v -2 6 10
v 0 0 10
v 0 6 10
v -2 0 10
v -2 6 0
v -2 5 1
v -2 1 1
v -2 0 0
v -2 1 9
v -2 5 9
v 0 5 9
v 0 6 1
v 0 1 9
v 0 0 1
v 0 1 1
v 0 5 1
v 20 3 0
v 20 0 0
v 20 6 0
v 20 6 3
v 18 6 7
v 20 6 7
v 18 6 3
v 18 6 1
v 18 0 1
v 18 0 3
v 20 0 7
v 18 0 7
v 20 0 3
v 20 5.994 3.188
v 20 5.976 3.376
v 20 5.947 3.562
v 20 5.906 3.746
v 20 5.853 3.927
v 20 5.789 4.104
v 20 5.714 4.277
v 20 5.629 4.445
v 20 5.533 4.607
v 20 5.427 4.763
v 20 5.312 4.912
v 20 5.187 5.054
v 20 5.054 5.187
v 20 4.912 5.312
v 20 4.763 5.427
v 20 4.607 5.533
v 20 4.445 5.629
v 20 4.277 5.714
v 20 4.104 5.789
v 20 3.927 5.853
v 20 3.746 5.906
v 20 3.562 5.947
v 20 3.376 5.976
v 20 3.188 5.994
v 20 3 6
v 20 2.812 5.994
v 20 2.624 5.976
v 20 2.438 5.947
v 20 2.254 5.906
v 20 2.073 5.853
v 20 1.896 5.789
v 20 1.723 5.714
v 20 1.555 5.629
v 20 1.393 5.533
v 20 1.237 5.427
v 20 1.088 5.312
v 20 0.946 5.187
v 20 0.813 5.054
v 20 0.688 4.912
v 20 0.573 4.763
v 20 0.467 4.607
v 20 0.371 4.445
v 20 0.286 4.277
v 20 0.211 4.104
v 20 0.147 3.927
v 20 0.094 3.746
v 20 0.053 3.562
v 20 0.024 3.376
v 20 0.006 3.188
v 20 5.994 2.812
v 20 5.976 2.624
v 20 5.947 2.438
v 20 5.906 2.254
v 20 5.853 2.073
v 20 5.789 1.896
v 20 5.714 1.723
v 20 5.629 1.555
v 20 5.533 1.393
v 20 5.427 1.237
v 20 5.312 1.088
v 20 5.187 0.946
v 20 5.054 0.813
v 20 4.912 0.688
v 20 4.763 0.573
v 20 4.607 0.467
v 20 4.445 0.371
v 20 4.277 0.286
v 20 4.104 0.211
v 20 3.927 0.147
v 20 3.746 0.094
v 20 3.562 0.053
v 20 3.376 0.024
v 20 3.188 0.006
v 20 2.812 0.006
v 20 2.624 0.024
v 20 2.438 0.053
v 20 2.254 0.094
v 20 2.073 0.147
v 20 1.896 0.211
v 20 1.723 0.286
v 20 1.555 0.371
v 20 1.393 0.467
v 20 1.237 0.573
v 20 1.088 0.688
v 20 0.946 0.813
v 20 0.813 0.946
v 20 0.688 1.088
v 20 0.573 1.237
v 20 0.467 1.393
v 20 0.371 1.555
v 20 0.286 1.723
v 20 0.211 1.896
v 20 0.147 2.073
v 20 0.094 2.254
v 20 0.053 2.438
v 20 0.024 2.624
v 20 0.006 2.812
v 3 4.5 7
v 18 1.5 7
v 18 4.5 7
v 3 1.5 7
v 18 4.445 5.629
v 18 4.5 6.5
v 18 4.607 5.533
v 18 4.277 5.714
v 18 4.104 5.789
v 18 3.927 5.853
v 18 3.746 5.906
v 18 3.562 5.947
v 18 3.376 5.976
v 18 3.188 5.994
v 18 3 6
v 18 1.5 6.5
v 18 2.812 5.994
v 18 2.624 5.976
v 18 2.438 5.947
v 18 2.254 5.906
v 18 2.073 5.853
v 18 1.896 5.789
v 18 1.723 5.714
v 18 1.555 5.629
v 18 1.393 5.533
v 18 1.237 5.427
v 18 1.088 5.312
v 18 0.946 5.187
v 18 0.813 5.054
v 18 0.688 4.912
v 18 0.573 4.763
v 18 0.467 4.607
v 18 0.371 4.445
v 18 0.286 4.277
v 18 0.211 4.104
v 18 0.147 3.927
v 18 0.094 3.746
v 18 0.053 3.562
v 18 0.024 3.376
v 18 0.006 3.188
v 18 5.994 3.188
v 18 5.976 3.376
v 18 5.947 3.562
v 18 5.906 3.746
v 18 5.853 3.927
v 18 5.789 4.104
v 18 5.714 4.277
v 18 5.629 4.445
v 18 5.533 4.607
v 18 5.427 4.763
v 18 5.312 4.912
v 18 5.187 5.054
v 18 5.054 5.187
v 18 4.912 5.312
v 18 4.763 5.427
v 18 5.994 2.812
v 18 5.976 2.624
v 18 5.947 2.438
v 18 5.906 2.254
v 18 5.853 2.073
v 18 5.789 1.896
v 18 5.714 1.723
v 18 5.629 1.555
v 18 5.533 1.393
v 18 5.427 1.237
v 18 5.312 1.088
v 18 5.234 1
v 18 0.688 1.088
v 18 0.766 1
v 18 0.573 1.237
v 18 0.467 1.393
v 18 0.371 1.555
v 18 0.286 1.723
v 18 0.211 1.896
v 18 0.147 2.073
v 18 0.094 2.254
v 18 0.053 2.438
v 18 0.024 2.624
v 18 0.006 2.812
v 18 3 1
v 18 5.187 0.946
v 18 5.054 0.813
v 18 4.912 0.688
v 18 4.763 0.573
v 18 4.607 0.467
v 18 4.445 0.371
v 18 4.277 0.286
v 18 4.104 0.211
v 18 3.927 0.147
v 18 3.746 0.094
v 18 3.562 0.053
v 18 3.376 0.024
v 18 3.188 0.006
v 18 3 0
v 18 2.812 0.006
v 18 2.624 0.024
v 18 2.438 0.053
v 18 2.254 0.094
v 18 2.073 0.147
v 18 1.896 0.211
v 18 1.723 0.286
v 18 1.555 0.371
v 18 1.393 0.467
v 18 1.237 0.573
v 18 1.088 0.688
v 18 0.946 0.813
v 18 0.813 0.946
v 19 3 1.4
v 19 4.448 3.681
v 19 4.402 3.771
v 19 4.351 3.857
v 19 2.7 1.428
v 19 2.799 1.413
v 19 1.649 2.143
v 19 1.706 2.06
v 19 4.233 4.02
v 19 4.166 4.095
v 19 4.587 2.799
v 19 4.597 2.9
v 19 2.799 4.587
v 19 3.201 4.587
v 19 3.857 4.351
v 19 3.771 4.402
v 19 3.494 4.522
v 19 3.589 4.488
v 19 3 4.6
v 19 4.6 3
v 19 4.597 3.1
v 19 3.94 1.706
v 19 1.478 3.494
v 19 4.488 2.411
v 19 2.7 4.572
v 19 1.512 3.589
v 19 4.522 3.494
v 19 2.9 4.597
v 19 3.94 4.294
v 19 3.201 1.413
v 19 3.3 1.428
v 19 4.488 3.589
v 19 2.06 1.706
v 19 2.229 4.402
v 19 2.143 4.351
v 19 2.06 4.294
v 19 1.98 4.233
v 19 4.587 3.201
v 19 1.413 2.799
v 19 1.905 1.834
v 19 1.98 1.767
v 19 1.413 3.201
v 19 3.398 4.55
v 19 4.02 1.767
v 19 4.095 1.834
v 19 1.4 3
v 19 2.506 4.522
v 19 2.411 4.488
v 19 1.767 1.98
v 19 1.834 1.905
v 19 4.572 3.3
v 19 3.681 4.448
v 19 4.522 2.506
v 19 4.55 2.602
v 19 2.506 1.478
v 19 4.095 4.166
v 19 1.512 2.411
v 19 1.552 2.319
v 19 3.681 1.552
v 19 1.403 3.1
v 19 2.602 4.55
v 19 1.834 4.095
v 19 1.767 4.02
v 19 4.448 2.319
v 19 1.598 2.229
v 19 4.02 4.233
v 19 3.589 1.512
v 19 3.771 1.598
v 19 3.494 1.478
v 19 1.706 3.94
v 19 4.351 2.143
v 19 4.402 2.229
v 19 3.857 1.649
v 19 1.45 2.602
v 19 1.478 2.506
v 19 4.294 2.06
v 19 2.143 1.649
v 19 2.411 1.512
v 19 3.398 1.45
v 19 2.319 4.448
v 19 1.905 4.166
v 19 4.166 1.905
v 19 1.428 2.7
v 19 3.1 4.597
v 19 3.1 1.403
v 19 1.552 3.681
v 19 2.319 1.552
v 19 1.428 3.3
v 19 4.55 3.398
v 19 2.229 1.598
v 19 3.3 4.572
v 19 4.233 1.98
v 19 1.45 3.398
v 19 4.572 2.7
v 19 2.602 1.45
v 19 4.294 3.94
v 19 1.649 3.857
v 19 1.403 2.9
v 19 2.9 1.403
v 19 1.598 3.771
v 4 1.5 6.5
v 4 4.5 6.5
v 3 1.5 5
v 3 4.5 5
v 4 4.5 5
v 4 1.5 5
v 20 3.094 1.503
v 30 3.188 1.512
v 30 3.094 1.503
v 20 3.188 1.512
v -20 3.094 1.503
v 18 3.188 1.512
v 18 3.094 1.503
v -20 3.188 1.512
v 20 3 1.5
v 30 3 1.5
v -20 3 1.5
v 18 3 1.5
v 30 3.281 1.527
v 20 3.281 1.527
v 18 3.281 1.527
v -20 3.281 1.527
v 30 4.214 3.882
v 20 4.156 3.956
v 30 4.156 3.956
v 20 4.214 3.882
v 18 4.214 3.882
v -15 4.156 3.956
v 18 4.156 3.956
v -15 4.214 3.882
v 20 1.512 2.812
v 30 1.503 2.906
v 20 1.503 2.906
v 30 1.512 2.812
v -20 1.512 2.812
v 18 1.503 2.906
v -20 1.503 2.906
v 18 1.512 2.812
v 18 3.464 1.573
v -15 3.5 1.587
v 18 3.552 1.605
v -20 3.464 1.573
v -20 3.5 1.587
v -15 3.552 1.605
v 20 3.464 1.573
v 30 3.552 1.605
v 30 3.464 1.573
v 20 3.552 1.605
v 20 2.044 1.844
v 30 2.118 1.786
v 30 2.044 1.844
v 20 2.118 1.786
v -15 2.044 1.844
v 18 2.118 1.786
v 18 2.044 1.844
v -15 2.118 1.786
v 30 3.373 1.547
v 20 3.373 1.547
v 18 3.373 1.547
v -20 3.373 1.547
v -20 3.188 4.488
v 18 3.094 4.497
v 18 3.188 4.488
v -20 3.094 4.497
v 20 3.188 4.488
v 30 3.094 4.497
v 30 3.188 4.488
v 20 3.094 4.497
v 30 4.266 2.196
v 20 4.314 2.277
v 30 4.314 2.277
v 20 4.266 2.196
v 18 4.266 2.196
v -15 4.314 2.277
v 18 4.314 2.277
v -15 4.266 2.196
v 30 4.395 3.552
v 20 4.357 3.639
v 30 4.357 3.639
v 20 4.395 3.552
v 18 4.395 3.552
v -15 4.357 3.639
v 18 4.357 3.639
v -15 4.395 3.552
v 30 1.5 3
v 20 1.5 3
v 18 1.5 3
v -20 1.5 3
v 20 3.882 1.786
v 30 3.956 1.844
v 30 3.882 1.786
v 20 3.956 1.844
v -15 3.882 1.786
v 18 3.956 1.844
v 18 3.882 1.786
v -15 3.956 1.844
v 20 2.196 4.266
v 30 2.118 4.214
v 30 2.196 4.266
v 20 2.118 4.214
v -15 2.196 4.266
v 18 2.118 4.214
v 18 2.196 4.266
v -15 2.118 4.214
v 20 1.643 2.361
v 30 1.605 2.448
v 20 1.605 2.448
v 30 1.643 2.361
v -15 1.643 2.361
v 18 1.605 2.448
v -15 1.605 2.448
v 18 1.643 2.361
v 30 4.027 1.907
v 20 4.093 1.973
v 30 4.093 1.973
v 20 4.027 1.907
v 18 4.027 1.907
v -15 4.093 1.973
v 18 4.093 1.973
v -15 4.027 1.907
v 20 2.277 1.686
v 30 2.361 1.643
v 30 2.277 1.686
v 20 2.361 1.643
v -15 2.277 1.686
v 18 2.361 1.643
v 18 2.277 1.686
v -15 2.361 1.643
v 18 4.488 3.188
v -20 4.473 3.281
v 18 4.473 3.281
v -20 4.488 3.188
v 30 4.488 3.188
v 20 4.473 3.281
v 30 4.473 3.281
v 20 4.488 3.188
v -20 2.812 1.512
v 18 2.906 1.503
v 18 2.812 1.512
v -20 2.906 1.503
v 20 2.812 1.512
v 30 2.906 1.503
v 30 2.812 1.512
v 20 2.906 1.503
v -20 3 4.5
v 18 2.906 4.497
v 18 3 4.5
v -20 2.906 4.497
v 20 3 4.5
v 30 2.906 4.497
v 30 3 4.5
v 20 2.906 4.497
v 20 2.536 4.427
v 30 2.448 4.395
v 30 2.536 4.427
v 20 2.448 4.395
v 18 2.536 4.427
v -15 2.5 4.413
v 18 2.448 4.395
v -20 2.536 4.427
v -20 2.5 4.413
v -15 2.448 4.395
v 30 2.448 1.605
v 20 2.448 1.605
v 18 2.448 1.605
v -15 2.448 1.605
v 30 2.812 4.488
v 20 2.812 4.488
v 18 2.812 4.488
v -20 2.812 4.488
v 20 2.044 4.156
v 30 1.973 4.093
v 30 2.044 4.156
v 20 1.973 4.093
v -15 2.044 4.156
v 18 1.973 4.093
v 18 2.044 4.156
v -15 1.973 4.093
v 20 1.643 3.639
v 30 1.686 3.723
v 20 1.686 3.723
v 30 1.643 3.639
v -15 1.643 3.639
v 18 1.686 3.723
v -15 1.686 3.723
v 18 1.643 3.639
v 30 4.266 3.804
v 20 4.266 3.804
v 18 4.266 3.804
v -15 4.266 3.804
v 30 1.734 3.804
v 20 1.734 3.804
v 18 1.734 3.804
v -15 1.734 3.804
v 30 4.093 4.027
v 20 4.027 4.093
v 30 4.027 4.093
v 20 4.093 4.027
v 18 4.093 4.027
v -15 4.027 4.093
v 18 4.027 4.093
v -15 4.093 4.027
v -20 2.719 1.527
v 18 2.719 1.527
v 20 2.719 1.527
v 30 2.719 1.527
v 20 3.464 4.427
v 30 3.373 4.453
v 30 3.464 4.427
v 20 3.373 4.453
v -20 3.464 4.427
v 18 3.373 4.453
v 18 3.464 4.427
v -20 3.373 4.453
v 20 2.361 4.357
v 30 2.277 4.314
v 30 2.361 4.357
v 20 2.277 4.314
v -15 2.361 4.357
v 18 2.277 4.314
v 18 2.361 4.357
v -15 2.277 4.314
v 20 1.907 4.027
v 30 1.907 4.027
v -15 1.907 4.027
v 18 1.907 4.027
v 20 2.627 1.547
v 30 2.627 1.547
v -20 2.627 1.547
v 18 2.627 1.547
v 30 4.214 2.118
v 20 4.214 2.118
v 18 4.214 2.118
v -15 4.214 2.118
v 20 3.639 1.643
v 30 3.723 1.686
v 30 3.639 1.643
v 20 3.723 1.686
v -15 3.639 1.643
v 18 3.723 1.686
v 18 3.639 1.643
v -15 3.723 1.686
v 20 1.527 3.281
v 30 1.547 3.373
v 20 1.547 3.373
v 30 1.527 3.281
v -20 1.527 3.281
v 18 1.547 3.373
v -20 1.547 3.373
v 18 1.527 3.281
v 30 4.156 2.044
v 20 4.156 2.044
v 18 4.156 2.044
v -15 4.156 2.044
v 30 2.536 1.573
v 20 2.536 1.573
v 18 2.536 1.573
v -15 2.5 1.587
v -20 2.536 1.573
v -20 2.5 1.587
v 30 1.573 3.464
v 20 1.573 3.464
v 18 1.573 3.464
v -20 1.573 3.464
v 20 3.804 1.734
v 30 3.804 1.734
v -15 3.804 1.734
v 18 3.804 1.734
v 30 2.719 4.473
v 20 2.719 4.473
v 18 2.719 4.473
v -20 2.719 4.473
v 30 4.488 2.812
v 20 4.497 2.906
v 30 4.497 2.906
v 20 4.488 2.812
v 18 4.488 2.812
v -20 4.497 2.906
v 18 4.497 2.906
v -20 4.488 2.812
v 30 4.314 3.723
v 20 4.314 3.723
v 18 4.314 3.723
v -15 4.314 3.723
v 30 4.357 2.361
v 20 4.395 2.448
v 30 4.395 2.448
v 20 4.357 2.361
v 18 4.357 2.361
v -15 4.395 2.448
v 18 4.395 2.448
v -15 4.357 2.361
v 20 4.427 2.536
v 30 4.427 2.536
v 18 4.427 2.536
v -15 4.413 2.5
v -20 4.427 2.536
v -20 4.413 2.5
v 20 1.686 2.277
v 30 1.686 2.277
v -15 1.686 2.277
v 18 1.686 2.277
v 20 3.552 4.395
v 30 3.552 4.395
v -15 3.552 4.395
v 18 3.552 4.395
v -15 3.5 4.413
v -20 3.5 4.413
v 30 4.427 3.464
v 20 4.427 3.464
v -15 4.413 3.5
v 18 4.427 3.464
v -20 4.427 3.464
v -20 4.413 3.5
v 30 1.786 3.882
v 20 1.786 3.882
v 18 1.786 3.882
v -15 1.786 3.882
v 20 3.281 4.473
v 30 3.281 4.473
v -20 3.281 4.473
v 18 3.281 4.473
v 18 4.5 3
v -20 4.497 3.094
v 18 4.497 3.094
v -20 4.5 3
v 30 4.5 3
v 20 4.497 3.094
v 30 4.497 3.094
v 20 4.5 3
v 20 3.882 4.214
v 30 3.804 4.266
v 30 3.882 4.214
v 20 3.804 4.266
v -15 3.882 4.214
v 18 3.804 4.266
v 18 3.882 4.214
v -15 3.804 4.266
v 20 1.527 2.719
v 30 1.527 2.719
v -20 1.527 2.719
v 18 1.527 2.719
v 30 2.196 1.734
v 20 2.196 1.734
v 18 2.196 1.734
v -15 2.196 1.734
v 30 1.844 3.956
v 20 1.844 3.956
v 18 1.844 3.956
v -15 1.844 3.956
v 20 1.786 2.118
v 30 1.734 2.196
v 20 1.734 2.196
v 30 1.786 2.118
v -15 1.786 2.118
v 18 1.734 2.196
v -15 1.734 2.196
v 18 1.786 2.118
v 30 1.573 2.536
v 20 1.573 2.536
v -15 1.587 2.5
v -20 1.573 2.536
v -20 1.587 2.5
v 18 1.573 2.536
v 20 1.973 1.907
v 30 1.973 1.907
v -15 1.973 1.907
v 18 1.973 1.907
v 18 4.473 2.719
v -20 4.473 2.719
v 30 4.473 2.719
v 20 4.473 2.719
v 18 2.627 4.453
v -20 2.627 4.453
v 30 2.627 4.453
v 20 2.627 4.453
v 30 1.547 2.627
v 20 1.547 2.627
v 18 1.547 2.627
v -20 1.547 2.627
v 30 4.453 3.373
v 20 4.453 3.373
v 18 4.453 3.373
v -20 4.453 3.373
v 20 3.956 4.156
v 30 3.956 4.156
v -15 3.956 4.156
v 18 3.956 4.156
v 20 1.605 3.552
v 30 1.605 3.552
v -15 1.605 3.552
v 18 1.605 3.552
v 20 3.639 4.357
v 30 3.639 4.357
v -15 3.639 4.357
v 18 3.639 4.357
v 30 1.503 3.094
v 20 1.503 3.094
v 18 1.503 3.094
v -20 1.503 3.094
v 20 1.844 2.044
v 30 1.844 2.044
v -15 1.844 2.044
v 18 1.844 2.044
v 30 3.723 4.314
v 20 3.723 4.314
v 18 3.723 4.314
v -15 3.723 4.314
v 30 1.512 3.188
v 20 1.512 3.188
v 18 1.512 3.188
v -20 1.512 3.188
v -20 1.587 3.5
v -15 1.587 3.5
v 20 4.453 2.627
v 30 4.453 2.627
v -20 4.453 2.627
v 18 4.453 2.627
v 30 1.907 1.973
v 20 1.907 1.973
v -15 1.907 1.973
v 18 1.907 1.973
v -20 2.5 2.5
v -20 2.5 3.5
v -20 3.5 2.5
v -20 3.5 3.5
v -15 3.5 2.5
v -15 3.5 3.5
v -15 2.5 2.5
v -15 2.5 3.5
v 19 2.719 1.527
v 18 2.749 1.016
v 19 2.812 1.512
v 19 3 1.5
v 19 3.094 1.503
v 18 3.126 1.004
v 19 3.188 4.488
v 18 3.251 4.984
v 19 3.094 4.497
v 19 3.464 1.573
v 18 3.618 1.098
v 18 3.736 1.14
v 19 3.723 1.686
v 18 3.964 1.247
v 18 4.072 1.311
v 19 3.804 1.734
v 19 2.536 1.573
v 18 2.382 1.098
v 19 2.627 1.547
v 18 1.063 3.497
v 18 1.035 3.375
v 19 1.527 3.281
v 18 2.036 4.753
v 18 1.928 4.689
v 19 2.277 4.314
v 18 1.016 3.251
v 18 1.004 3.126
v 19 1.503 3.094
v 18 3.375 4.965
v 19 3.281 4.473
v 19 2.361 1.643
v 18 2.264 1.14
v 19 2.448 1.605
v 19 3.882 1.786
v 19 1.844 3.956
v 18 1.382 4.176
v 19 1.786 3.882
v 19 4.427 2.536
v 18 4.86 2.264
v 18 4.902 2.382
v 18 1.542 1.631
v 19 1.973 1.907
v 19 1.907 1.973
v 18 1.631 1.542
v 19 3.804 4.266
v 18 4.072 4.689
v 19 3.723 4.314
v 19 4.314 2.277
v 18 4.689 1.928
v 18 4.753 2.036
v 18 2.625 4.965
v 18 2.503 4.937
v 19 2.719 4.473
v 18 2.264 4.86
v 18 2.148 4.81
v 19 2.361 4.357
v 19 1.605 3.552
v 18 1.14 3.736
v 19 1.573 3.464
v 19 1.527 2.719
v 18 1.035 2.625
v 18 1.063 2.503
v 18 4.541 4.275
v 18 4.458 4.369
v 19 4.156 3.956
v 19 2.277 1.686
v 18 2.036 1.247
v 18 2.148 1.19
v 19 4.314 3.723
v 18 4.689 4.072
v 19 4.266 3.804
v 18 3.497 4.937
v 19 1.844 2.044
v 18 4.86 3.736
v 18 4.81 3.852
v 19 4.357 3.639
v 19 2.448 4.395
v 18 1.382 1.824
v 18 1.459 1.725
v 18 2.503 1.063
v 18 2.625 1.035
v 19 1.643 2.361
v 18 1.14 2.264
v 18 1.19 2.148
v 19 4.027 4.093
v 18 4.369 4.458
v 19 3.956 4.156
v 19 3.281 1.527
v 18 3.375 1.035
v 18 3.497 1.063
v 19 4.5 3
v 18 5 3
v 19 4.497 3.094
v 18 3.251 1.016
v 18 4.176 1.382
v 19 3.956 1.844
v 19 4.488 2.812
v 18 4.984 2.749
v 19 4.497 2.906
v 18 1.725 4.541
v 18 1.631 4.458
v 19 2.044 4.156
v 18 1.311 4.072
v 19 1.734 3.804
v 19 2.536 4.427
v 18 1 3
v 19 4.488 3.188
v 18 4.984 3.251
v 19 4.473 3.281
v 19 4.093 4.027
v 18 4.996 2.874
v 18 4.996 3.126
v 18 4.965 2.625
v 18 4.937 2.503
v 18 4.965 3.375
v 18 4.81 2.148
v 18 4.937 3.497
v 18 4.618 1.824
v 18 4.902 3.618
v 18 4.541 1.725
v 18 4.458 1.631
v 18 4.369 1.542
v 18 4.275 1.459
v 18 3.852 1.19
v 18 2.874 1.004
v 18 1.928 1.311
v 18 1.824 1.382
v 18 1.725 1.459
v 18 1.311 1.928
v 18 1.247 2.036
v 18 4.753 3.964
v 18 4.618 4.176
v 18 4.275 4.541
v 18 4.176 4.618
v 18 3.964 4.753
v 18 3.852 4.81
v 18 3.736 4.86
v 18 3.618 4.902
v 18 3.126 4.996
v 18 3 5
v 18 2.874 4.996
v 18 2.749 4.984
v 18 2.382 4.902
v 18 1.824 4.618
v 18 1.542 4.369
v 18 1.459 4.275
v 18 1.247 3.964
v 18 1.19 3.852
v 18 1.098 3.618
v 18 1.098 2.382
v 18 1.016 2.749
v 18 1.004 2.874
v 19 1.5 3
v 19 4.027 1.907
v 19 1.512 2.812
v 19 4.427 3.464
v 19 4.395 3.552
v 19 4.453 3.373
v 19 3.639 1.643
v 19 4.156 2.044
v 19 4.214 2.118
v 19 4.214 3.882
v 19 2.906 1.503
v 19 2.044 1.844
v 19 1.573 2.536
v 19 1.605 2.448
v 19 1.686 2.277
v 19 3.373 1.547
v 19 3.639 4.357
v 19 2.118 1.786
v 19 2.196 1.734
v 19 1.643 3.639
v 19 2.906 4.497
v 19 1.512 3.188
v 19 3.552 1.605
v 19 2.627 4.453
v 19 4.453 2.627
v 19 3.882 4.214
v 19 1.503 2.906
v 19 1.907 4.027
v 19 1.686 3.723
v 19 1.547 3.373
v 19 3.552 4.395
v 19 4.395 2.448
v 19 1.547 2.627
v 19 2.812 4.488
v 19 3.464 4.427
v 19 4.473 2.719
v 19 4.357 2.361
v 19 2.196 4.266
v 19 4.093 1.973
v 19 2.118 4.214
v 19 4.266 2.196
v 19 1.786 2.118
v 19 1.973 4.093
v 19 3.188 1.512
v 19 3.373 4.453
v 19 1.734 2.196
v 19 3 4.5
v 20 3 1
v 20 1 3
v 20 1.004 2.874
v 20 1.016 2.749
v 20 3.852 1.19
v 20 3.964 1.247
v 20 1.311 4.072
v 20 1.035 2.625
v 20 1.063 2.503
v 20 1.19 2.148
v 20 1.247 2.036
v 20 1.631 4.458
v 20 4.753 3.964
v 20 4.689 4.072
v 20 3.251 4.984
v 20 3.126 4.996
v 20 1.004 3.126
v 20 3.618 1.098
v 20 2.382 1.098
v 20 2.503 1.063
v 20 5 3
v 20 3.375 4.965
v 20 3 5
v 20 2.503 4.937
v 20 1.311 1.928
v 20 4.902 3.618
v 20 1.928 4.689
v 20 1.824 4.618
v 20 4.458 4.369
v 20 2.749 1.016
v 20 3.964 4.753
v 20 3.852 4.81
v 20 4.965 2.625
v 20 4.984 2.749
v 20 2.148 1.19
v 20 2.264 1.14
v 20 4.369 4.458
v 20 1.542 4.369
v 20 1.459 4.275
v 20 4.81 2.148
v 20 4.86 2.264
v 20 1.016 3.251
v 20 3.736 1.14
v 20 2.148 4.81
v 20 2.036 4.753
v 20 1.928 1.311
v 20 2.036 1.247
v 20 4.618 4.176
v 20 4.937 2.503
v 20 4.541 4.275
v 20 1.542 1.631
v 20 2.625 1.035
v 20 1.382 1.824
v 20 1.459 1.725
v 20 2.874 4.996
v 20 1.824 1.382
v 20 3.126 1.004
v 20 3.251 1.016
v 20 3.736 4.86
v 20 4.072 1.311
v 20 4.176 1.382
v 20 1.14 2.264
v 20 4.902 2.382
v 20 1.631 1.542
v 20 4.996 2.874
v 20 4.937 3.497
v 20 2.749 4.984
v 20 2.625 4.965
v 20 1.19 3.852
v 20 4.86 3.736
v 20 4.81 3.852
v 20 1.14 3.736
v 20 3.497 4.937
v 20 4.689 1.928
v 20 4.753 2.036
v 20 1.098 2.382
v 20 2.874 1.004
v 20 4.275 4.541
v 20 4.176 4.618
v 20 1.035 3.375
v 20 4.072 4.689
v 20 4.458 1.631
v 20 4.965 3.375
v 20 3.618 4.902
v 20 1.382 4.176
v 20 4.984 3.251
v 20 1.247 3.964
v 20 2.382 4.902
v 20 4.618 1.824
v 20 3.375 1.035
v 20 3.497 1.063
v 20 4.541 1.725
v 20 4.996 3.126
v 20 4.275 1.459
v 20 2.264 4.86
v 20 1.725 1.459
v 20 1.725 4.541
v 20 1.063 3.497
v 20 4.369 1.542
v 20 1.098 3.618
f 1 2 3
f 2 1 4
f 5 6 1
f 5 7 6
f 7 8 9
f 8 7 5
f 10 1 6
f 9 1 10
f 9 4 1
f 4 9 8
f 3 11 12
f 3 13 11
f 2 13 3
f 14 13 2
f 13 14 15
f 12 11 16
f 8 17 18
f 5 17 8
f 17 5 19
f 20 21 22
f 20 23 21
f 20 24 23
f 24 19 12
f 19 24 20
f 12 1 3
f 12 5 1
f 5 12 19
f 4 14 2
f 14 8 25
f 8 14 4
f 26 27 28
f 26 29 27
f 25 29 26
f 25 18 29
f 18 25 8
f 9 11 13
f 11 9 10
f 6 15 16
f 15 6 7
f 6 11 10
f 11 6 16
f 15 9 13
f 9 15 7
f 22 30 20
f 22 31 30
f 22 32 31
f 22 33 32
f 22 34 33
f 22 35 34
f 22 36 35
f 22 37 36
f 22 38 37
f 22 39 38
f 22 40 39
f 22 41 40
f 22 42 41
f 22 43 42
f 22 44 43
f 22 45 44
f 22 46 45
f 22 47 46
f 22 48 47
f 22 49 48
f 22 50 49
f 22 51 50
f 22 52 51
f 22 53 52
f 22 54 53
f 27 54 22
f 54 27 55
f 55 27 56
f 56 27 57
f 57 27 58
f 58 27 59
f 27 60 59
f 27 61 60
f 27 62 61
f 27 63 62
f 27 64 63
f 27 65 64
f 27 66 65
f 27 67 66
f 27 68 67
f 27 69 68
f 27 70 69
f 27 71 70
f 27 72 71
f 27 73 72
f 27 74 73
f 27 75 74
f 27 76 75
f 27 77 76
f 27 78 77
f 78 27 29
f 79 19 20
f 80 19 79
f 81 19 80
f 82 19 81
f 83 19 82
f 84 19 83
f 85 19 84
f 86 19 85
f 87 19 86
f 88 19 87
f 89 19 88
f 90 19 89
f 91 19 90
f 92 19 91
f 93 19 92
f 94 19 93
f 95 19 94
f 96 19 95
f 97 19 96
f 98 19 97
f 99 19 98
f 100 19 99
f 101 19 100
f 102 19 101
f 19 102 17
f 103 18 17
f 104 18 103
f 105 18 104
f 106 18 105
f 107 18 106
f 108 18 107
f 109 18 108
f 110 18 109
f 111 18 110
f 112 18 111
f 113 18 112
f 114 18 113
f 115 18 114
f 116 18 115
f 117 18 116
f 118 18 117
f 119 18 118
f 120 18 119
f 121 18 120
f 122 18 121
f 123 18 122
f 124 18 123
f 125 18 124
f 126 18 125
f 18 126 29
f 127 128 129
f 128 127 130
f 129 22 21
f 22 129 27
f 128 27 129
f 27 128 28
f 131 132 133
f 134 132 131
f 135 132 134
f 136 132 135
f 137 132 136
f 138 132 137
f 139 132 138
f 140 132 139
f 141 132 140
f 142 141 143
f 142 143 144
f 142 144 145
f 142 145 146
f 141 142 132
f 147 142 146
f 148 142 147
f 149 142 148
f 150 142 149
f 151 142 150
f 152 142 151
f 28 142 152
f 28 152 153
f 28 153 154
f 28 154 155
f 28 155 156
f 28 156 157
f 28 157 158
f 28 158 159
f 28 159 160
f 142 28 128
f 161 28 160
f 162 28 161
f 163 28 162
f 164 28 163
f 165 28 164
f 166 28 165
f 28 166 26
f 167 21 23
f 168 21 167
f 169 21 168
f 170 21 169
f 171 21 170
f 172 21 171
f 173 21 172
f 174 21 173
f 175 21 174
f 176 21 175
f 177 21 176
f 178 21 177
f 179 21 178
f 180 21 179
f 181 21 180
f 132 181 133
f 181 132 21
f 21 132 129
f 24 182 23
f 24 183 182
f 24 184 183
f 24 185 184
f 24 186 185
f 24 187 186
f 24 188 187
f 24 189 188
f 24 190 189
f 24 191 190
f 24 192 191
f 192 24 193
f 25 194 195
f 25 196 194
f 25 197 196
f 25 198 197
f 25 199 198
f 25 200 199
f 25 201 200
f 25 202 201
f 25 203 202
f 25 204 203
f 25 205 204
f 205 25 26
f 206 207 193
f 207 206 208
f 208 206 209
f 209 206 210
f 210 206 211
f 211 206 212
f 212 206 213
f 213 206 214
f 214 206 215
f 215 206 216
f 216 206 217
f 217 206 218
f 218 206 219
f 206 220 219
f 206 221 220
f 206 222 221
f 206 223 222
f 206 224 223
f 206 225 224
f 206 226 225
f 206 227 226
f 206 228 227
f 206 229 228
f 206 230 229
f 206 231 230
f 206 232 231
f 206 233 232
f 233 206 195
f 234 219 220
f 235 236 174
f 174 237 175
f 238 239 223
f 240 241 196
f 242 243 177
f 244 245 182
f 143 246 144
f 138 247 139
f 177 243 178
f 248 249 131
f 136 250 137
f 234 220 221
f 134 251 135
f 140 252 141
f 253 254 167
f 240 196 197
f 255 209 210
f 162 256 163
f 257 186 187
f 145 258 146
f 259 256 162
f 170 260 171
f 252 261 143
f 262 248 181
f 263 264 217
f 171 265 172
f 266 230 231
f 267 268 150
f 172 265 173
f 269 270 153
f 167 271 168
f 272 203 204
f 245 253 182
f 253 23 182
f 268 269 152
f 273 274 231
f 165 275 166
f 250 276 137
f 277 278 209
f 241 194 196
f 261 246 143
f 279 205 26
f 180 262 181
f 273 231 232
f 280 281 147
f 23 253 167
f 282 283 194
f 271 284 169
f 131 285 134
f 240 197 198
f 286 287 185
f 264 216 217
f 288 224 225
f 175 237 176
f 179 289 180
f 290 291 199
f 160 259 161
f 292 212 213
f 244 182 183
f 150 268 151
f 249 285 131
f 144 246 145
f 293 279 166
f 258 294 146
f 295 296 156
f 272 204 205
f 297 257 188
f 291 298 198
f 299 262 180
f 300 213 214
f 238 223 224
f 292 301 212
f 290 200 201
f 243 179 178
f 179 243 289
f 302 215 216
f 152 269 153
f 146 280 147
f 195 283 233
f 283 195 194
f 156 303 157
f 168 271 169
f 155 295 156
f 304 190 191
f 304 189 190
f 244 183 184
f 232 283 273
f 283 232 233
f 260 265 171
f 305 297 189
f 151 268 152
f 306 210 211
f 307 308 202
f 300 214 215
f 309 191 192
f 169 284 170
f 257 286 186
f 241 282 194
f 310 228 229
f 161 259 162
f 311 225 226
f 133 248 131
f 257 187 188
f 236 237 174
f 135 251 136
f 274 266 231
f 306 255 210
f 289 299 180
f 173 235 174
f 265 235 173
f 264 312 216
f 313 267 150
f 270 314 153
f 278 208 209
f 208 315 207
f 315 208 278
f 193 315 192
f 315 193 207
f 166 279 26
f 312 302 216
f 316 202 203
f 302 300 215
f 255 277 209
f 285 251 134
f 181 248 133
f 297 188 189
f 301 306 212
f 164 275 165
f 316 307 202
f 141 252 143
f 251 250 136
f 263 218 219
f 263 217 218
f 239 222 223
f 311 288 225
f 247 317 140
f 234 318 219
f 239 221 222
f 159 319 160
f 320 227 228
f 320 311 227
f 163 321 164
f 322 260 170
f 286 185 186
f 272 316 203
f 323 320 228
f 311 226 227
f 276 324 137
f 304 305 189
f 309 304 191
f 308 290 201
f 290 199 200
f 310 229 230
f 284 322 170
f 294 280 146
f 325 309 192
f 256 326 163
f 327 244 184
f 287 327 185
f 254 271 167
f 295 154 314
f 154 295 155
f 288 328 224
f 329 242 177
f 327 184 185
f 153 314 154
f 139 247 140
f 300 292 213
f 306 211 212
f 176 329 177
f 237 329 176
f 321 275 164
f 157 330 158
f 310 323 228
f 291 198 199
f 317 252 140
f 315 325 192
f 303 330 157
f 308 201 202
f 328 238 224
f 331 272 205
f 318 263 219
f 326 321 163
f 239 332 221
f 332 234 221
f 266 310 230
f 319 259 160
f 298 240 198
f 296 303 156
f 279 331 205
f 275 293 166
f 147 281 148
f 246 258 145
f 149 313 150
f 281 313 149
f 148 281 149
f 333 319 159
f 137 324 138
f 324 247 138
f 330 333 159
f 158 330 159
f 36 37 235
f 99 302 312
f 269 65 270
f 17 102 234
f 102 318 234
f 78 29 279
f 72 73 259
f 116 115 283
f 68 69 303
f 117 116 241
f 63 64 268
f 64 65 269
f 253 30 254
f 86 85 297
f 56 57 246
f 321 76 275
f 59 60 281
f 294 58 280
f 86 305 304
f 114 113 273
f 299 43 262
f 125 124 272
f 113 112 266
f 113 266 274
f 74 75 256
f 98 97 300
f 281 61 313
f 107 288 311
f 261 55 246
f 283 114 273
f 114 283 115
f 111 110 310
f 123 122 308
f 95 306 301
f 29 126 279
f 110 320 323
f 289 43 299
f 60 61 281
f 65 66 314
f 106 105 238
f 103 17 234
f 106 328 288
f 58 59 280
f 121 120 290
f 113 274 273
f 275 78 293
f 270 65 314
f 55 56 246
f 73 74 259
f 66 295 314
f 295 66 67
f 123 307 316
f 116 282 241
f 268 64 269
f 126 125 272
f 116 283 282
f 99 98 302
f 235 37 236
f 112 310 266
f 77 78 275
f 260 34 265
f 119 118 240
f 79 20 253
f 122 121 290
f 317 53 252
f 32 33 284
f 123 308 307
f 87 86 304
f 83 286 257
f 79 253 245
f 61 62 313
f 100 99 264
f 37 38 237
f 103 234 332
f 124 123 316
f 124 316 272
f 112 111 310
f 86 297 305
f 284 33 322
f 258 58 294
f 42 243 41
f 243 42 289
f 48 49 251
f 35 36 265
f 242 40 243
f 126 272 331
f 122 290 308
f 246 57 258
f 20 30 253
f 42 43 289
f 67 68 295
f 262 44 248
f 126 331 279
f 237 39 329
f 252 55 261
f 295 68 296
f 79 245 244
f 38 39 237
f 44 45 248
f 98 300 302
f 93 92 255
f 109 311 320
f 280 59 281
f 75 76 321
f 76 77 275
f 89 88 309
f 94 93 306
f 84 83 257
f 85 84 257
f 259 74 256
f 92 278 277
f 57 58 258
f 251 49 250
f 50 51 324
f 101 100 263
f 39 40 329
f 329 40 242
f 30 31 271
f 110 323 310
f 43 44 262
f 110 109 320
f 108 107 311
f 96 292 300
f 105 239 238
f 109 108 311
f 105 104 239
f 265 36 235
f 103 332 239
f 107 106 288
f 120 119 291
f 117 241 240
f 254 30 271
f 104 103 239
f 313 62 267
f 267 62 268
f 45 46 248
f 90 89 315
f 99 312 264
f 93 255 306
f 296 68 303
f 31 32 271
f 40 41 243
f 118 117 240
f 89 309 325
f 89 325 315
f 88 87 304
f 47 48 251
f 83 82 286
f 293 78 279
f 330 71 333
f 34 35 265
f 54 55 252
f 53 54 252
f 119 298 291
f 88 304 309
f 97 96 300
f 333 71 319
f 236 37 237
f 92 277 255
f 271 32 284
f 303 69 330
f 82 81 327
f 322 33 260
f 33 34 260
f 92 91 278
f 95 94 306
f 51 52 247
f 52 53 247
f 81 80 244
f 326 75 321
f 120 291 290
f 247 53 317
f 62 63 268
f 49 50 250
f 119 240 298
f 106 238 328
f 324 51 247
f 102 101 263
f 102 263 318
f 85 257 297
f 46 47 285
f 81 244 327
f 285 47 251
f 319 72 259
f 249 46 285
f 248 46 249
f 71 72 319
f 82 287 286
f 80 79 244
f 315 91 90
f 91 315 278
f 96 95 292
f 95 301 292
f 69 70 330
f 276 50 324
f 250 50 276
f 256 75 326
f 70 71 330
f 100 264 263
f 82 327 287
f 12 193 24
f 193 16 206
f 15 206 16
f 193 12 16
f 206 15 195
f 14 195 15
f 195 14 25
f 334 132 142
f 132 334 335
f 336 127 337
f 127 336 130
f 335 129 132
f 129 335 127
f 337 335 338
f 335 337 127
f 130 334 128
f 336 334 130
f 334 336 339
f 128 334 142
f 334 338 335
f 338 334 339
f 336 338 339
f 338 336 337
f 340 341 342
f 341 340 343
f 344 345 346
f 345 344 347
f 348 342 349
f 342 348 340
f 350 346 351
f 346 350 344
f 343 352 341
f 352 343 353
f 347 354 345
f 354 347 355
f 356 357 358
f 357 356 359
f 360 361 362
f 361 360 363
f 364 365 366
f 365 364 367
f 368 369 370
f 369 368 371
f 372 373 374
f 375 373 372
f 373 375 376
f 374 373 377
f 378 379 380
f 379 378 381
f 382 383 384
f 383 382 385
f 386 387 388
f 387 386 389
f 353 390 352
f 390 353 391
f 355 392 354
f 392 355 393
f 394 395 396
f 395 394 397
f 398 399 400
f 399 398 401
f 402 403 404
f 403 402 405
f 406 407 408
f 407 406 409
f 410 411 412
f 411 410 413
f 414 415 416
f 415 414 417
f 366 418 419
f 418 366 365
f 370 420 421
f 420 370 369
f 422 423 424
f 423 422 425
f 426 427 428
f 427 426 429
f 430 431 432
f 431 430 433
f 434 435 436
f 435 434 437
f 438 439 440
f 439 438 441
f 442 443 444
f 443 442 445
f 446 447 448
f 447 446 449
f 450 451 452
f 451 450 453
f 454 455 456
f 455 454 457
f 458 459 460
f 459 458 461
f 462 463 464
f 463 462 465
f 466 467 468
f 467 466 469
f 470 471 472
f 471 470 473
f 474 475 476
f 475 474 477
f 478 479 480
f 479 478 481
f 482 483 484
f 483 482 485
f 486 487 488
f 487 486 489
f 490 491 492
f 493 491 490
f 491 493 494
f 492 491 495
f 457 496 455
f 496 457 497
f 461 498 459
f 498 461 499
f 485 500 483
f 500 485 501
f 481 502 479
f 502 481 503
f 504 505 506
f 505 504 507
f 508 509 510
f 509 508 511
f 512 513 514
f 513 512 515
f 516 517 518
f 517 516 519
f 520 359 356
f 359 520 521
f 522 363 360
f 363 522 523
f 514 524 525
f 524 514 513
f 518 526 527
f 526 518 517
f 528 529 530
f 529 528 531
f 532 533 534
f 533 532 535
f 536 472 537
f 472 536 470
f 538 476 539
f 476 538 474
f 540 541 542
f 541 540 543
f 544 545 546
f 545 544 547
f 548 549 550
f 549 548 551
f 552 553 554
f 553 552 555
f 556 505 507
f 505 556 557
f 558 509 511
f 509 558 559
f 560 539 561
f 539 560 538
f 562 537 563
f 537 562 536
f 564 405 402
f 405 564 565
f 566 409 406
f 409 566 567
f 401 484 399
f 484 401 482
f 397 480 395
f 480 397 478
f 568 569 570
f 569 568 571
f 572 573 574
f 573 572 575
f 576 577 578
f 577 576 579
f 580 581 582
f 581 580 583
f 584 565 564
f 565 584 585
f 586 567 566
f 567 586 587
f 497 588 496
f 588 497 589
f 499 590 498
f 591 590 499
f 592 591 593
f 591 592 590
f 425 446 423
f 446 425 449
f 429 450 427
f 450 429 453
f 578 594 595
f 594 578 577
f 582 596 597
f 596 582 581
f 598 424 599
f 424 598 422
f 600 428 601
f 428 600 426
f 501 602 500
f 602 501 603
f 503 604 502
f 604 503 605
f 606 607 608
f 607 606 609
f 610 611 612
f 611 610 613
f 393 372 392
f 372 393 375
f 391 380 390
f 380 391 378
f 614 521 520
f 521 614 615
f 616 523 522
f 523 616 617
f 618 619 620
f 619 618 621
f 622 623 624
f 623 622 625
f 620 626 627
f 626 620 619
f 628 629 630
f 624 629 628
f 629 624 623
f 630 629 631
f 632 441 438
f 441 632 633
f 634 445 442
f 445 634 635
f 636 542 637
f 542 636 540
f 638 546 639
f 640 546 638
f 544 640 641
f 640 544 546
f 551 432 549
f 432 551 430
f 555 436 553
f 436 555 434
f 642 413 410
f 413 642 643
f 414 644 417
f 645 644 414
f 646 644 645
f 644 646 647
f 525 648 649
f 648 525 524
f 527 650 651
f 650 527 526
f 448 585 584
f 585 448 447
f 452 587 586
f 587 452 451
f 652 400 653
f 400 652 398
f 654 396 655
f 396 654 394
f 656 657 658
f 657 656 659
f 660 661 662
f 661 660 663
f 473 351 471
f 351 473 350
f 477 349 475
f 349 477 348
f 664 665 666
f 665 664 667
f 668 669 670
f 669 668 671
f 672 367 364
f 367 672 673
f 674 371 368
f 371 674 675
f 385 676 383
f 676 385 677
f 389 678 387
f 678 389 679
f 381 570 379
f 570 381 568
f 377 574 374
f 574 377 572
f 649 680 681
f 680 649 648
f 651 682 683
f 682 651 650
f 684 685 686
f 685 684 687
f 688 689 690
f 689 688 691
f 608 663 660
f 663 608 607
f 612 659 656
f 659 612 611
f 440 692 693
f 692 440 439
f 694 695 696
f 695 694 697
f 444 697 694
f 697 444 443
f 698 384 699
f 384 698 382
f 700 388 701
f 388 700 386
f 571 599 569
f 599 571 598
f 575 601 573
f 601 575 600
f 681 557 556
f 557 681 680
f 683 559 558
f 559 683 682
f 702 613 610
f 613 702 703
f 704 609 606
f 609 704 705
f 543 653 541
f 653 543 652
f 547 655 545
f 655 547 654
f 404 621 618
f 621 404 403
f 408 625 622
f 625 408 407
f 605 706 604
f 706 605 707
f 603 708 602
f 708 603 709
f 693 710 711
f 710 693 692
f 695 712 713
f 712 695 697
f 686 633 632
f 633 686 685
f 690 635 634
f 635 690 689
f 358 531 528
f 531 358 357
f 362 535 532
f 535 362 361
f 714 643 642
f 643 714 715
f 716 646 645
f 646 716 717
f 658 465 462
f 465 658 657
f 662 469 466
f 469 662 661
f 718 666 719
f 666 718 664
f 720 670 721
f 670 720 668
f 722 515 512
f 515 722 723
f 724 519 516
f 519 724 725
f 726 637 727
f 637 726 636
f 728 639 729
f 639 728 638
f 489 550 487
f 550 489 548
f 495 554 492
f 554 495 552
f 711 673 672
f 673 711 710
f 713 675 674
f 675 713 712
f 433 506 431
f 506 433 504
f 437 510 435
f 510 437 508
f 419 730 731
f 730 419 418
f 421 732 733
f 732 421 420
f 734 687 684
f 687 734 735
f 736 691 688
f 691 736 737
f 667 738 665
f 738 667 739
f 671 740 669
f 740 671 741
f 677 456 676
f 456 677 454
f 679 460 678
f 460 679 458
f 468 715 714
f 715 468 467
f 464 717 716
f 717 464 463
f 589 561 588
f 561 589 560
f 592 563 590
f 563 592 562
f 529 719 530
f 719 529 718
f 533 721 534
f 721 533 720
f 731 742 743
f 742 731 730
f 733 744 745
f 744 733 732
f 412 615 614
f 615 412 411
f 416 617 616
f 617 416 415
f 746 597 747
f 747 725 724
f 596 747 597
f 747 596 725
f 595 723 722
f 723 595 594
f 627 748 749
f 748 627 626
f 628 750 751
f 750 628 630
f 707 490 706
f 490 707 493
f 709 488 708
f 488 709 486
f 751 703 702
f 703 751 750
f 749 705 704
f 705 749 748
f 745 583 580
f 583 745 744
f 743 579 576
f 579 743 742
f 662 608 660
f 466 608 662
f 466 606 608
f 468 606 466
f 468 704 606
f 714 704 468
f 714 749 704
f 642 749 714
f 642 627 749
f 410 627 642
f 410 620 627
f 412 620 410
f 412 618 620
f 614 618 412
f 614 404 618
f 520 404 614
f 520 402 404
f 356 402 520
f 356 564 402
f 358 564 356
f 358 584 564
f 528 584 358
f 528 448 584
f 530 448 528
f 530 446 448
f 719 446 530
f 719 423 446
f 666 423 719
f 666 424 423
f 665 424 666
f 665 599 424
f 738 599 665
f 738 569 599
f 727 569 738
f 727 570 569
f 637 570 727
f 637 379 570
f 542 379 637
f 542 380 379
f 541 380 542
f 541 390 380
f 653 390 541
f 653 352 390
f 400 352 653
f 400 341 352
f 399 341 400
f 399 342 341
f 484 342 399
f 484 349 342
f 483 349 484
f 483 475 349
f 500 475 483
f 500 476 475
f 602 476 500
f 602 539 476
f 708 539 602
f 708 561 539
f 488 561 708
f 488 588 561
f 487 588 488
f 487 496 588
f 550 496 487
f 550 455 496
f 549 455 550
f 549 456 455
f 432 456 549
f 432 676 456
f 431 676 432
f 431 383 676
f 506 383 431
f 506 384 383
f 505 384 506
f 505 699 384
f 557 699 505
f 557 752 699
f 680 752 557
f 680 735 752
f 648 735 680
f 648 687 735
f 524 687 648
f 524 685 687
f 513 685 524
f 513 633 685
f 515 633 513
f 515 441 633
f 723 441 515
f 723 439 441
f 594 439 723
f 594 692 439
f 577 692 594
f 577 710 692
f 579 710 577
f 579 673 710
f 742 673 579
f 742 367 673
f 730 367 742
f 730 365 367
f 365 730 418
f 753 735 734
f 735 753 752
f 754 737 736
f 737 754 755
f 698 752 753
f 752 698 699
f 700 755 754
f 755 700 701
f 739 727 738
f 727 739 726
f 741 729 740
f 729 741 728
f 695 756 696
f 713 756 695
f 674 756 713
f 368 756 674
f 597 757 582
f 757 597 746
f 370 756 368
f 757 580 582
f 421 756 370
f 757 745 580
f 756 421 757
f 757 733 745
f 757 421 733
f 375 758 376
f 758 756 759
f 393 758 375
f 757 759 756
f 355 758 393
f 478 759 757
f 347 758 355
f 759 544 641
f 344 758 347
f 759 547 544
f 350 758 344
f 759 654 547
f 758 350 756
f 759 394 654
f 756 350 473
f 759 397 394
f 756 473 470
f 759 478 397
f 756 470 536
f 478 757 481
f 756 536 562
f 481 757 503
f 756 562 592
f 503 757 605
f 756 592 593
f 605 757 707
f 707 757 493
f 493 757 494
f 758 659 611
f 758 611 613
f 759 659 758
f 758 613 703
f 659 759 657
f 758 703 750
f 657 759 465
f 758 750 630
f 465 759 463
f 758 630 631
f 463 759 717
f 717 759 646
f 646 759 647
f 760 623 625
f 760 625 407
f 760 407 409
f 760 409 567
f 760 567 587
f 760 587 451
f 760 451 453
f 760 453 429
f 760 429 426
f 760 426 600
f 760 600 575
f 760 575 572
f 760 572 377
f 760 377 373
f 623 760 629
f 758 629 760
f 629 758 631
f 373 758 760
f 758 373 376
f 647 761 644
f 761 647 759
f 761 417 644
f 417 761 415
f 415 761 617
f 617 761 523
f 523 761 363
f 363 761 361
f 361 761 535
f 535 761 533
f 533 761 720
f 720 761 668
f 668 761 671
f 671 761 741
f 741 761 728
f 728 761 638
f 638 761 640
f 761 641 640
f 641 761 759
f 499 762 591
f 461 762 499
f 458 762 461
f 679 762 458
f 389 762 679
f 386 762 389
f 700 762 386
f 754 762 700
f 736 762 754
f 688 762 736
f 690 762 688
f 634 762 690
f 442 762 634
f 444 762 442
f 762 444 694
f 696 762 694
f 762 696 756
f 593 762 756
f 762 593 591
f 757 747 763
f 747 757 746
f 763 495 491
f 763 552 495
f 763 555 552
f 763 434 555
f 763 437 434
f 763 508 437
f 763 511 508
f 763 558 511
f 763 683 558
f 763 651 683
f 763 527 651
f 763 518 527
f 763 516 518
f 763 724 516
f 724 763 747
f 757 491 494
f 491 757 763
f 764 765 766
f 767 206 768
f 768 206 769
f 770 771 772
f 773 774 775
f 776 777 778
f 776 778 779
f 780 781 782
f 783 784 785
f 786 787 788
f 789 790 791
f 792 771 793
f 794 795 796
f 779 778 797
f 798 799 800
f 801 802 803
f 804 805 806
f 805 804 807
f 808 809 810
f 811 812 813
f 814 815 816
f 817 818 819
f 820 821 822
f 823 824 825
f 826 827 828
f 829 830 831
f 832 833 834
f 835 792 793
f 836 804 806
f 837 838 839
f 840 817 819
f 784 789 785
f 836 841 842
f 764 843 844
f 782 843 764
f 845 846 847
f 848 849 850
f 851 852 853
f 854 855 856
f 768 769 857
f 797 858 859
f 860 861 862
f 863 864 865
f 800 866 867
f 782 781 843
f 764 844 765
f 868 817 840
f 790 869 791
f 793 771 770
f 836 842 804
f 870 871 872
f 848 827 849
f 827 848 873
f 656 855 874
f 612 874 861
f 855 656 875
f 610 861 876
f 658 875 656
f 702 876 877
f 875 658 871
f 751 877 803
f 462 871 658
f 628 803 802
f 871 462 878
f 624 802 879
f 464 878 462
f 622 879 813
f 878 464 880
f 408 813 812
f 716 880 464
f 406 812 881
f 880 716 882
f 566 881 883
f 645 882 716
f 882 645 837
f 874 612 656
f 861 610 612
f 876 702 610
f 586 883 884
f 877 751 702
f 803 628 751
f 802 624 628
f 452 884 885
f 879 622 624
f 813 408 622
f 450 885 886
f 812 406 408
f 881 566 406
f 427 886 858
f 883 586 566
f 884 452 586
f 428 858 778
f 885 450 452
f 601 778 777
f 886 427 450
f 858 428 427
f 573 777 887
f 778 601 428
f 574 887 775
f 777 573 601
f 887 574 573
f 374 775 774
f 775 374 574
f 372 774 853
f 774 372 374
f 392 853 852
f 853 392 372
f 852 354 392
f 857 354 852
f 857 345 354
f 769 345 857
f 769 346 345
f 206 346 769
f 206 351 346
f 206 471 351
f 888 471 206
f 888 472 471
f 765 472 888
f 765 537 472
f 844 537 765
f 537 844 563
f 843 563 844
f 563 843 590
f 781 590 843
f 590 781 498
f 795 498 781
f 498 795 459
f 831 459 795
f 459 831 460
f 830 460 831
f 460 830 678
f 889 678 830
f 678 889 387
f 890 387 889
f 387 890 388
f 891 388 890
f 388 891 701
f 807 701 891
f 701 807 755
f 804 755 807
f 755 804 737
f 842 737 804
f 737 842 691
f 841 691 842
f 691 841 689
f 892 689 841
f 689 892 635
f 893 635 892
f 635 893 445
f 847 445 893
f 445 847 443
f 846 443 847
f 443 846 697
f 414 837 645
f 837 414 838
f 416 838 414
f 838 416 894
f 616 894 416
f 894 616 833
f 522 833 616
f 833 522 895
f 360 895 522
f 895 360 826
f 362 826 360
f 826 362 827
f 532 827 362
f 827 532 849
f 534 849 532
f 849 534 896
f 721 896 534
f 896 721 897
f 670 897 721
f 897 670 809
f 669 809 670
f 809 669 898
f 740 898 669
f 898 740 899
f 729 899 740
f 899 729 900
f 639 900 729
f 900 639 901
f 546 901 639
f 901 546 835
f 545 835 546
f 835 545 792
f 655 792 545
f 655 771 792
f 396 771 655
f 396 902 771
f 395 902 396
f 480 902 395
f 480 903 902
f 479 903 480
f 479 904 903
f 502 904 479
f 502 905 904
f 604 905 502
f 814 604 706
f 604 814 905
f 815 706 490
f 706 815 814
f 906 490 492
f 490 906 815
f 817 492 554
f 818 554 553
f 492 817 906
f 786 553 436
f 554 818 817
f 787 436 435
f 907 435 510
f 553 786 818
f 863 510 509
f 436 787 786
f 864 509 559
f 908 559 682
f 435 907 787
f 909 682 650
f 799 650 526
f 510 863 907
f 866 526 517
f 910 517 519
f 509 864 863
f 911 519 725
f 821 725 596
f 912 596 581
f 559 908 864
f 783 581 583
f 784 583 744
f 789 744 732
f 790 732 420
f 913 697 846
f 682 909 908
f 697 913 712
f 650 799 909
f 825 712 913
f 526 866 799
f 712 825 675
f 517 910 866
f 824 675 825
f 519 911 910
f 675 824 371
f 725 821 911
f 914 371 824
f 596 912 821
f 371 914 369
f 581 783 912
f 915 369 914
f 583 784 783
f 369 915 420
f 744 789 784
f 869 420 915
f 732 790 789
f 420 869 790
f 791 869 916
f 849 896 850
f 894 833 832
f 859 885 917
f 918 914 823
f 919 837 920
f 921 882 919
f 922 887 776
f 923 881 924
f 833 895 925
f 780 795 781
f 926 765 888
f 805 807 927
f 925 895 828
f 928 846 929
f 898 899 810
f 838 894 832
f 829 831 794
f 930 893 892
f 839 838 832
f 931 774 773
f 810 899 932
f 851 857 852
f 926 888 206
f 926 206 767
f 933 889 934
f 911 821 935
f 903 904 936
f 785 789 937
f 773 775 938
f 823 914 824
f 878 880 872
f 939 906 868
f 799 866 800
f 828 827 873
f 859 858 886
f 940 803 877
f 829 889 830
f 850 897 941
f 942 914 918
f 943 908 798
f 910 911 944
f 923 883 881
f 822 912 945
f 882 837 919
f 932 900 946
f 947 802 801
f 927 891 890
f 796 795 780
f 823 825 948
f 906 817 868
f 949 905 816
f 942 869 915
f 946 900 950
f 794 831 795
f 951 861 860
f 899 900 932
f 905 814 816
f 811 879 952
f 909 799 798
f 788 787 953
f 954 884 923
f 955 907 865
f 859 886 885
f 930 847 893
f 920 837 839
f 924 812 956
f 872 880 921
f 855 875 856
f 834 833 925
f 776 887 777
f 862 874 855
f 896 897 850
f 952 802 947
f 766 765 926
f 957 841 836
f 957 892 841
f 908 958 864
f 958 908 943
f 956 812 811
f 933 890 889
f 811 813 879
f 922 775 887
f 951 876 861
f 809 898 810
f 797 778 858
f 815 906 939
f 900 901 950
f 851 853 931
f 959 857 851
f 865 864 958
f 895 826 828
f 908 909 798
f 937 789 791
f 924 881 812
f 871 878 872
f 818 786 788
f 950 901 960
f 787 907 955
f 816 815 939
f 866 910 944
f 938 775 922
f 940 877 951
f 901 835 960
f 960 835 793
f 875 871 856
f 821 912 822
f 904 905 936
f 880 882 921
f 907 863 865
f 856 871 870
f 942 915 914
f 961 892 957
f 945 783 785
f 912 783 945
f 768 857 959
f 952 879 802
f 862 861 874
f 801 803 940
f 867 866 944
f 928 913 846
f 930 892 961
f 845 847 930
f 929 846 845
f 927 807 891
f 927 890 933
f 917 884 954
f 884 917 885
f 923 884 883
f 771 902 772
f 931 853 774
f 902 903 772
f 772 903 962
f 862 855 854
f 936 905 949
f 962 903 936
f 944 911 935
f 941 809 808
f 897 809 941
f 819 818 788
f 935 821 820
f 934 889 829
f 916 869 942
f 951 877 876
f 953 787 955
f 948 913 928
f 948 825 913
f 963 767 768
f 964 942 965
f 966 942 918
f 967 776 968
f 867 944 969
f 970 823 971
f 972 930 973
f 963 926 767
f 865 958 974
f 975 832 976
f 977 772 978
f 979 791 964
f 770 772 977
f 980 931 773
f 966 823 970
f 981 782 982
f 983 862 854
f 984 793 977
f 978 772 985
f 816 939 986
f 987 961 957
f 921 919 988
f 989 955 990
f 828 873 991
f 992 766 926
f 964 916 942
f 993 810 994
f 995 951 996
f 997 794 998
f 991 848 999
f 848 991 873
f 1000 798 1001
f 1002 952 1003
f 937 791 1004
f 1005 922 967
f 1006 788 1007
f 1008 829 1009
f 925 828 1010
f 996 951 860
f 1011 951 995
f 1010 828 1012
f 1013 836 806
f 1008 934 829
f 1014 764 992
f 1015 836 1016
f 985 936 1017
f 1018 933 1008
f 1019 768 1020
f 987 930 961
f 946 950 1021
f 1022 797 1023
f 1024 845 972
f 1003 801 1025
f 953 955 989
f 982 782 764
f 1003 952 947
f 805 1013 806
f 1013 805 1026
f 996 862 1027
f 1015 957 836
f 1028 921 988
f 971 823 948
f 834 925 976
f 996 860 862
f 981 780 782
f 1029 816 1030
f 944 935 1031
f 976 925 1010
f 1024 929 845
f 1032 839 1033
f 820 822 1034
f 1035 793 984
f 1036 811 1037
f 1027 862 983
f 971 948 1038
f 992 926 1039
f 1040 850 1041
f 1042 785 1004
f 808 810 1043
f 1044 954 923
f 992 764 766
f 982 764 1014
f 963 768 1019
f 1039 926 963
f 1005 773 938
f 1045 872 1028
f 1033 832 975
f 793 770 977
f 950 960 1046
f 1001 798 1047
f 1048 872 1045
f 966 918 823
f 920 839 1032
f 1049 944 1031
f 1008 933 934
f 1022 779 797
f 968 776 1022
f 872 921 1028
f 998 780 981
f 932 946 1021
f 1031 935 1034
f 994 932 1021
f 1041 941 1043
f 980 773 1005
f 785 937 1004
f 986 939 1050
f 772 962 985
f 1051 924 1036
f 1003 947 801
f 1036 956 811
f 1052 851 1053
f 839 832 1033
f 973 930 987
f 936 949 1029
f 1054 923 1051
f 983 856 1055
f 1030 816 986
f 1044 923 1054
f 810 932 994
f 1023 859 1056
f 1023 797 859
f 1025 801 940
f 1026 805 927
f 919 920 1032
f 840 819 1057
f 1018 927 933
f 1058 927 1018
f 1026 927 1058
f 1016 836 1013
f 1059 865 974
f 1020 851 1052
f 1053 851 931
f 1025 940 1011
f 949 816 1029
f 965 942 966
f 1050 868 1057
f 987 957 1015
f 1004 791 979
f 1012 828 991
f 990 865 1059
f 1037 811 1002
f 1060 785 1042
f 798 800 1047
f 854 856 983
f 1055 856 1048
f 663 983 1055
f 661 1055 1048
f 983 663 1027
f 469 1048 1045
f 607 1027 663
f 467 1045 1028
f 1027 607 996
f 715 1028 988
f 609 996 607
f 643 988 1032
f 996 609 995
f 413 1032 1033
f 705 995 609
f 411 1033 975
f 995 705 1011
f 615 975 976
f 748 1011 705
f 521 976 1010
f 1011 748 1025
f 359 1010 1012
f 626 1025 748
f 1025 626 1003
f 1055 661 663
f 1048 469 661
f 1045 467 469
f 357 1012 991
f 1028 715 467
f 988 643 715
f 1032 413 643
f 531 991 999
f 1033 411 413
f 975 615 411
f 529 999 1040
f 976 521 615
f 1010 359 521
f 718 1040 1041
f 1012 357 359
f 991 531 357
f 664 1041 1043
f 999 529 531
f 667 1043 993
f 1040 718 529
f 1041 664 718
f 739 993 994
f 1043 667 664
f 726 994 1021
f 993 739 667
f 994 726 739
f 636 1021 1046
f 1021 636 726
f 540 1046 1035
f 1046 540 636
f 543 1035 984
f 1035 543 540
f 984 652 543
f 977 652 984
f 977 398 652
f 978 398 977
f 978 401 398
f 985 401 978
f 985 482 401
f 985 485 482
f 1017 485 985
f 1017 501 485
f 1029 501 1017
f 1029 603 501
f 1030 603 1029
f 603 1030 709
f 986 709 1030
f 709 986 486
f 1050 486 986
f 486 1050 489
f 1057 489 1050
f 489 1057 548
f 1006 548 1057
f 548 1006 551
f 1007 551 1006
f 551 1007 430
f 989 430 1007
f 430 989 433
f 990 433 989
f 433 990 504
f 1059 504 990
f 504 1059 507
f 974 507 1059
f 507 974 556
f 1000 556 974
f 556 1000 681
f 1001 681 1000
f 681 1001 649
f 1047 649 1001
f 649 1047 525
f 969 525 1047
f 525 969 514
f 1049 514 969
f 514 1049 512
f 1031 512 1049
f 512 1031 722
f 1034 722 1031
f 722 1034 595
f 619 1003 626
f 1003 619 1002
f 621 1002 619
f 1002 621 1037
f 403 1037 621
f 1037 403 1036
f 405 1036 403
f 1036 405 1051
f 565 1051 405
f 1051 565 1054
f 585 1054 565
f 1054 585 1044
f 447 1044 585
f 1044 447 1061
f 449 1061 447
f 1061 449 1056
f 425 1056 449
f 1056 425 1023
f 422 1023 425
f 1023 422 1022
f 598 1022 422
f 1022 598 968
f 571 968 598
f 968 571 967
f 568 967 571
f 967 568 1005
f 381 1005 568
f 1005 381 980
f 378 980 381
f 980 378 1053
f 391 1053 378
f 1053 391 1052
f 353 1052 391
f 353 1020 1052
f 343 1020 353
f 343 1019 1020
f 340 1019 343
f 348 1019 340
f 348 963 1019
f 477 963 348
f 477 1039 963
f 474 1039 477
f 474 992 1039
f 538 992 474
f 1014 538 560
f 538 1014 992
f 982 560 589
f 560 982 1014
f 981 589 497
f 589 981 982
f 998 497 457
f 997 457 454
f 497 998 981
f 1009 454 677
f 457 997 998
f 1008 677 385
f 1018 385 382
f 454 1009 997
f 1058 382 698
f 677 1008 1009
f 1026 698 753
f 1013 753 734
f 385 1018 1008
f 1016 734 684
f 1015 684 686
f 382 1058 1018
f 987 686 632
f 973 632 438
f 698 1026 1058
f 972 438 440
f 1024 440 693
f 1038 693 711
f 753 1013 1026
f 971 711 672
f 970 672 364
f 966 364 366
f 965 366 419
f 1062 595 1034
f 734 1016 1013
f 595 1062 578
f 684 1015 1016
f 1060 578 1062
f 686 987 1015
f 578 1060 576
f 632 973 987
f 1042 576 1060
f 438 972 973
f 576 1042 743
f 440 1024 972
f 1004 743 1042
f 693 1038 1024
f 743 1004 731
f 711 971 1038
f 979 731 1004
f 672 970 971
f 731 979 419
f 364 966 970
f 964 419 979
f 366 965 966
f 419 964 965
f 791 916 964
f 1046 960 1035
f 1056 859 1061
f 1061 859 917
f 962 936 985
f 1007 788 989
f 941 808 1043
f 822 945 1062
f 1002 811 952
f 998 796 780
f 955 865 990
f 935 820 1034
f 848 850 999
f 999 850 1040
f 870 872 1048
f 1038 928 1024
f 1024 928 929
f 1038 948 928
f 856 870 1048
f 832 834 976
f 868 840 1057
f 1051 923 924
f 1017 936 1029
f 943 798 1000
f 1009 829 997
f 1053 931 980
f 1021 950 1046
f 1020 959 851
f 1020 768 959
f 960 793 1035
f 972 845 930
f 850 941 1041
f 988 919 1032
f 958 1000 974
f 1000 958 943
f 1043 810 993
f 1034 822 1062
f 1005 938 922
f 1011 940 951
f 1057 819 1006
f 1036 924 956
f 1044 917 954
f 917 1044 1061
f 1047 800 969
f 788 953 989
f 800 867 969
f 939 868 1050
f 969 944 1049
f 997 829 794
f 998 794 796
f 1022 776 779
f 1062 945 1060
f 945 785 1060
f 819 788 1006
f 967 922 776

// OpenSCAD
module wheel_border() {
    $fn = 100;

    rotate([0, -90, 0])
    difference() {
        cube([10, 6, 2]);
        
        translate([1,1,-1])
        cube([8, 4, 4]);
    }

    cube([18, 6, 1]);
    
    translate([18, 0, 0])
    difference() {
        cube([2, 6, 7]);

        translate([0, 3, 3])
        rotate([0, 90, 0])
        cylinder(1, 3, 1.6);
        
        translate([1, 3, 3])
        rotate([0, 90, 0])
        cylinder(1, 1.6, 3);
    }
    
    translate([3, 1.5, 6.5])
    cube([15, 3, 0.5]);
    
    translate([3, 1.5, 5])
    cube([1, 3, 2]);
    
};

module wheel_axis() {
    $fn = 100;

    translate([-20, 3, 3])
    rotate([0, 90, 0])
    difference() {
        cylinder(50, 1.5, 1.5);
        
        translate([0.5, 0.5, -1])
        cube([1, 1, 6]);
        
        translate([-1.5, 0.5, -1])
        cube([1, 1, 6]);
        
        translate([0.5, -1.5, -1])
        cube([1, 1, 6]);
        
        translate([-1.5, -1.5, -1])
        cube([1, 1, 6]);
    }
    
    translate([18, 3, 3])
    rotate([0, 90, 0])
    cylinder(1, 2, 1.5);
    
    translate([19, 3, 3])
    rotate([0, 90, 0])
    cylinder(1, 1.5, 2);
    
    
}

wheel_border();

wheel_axis();
